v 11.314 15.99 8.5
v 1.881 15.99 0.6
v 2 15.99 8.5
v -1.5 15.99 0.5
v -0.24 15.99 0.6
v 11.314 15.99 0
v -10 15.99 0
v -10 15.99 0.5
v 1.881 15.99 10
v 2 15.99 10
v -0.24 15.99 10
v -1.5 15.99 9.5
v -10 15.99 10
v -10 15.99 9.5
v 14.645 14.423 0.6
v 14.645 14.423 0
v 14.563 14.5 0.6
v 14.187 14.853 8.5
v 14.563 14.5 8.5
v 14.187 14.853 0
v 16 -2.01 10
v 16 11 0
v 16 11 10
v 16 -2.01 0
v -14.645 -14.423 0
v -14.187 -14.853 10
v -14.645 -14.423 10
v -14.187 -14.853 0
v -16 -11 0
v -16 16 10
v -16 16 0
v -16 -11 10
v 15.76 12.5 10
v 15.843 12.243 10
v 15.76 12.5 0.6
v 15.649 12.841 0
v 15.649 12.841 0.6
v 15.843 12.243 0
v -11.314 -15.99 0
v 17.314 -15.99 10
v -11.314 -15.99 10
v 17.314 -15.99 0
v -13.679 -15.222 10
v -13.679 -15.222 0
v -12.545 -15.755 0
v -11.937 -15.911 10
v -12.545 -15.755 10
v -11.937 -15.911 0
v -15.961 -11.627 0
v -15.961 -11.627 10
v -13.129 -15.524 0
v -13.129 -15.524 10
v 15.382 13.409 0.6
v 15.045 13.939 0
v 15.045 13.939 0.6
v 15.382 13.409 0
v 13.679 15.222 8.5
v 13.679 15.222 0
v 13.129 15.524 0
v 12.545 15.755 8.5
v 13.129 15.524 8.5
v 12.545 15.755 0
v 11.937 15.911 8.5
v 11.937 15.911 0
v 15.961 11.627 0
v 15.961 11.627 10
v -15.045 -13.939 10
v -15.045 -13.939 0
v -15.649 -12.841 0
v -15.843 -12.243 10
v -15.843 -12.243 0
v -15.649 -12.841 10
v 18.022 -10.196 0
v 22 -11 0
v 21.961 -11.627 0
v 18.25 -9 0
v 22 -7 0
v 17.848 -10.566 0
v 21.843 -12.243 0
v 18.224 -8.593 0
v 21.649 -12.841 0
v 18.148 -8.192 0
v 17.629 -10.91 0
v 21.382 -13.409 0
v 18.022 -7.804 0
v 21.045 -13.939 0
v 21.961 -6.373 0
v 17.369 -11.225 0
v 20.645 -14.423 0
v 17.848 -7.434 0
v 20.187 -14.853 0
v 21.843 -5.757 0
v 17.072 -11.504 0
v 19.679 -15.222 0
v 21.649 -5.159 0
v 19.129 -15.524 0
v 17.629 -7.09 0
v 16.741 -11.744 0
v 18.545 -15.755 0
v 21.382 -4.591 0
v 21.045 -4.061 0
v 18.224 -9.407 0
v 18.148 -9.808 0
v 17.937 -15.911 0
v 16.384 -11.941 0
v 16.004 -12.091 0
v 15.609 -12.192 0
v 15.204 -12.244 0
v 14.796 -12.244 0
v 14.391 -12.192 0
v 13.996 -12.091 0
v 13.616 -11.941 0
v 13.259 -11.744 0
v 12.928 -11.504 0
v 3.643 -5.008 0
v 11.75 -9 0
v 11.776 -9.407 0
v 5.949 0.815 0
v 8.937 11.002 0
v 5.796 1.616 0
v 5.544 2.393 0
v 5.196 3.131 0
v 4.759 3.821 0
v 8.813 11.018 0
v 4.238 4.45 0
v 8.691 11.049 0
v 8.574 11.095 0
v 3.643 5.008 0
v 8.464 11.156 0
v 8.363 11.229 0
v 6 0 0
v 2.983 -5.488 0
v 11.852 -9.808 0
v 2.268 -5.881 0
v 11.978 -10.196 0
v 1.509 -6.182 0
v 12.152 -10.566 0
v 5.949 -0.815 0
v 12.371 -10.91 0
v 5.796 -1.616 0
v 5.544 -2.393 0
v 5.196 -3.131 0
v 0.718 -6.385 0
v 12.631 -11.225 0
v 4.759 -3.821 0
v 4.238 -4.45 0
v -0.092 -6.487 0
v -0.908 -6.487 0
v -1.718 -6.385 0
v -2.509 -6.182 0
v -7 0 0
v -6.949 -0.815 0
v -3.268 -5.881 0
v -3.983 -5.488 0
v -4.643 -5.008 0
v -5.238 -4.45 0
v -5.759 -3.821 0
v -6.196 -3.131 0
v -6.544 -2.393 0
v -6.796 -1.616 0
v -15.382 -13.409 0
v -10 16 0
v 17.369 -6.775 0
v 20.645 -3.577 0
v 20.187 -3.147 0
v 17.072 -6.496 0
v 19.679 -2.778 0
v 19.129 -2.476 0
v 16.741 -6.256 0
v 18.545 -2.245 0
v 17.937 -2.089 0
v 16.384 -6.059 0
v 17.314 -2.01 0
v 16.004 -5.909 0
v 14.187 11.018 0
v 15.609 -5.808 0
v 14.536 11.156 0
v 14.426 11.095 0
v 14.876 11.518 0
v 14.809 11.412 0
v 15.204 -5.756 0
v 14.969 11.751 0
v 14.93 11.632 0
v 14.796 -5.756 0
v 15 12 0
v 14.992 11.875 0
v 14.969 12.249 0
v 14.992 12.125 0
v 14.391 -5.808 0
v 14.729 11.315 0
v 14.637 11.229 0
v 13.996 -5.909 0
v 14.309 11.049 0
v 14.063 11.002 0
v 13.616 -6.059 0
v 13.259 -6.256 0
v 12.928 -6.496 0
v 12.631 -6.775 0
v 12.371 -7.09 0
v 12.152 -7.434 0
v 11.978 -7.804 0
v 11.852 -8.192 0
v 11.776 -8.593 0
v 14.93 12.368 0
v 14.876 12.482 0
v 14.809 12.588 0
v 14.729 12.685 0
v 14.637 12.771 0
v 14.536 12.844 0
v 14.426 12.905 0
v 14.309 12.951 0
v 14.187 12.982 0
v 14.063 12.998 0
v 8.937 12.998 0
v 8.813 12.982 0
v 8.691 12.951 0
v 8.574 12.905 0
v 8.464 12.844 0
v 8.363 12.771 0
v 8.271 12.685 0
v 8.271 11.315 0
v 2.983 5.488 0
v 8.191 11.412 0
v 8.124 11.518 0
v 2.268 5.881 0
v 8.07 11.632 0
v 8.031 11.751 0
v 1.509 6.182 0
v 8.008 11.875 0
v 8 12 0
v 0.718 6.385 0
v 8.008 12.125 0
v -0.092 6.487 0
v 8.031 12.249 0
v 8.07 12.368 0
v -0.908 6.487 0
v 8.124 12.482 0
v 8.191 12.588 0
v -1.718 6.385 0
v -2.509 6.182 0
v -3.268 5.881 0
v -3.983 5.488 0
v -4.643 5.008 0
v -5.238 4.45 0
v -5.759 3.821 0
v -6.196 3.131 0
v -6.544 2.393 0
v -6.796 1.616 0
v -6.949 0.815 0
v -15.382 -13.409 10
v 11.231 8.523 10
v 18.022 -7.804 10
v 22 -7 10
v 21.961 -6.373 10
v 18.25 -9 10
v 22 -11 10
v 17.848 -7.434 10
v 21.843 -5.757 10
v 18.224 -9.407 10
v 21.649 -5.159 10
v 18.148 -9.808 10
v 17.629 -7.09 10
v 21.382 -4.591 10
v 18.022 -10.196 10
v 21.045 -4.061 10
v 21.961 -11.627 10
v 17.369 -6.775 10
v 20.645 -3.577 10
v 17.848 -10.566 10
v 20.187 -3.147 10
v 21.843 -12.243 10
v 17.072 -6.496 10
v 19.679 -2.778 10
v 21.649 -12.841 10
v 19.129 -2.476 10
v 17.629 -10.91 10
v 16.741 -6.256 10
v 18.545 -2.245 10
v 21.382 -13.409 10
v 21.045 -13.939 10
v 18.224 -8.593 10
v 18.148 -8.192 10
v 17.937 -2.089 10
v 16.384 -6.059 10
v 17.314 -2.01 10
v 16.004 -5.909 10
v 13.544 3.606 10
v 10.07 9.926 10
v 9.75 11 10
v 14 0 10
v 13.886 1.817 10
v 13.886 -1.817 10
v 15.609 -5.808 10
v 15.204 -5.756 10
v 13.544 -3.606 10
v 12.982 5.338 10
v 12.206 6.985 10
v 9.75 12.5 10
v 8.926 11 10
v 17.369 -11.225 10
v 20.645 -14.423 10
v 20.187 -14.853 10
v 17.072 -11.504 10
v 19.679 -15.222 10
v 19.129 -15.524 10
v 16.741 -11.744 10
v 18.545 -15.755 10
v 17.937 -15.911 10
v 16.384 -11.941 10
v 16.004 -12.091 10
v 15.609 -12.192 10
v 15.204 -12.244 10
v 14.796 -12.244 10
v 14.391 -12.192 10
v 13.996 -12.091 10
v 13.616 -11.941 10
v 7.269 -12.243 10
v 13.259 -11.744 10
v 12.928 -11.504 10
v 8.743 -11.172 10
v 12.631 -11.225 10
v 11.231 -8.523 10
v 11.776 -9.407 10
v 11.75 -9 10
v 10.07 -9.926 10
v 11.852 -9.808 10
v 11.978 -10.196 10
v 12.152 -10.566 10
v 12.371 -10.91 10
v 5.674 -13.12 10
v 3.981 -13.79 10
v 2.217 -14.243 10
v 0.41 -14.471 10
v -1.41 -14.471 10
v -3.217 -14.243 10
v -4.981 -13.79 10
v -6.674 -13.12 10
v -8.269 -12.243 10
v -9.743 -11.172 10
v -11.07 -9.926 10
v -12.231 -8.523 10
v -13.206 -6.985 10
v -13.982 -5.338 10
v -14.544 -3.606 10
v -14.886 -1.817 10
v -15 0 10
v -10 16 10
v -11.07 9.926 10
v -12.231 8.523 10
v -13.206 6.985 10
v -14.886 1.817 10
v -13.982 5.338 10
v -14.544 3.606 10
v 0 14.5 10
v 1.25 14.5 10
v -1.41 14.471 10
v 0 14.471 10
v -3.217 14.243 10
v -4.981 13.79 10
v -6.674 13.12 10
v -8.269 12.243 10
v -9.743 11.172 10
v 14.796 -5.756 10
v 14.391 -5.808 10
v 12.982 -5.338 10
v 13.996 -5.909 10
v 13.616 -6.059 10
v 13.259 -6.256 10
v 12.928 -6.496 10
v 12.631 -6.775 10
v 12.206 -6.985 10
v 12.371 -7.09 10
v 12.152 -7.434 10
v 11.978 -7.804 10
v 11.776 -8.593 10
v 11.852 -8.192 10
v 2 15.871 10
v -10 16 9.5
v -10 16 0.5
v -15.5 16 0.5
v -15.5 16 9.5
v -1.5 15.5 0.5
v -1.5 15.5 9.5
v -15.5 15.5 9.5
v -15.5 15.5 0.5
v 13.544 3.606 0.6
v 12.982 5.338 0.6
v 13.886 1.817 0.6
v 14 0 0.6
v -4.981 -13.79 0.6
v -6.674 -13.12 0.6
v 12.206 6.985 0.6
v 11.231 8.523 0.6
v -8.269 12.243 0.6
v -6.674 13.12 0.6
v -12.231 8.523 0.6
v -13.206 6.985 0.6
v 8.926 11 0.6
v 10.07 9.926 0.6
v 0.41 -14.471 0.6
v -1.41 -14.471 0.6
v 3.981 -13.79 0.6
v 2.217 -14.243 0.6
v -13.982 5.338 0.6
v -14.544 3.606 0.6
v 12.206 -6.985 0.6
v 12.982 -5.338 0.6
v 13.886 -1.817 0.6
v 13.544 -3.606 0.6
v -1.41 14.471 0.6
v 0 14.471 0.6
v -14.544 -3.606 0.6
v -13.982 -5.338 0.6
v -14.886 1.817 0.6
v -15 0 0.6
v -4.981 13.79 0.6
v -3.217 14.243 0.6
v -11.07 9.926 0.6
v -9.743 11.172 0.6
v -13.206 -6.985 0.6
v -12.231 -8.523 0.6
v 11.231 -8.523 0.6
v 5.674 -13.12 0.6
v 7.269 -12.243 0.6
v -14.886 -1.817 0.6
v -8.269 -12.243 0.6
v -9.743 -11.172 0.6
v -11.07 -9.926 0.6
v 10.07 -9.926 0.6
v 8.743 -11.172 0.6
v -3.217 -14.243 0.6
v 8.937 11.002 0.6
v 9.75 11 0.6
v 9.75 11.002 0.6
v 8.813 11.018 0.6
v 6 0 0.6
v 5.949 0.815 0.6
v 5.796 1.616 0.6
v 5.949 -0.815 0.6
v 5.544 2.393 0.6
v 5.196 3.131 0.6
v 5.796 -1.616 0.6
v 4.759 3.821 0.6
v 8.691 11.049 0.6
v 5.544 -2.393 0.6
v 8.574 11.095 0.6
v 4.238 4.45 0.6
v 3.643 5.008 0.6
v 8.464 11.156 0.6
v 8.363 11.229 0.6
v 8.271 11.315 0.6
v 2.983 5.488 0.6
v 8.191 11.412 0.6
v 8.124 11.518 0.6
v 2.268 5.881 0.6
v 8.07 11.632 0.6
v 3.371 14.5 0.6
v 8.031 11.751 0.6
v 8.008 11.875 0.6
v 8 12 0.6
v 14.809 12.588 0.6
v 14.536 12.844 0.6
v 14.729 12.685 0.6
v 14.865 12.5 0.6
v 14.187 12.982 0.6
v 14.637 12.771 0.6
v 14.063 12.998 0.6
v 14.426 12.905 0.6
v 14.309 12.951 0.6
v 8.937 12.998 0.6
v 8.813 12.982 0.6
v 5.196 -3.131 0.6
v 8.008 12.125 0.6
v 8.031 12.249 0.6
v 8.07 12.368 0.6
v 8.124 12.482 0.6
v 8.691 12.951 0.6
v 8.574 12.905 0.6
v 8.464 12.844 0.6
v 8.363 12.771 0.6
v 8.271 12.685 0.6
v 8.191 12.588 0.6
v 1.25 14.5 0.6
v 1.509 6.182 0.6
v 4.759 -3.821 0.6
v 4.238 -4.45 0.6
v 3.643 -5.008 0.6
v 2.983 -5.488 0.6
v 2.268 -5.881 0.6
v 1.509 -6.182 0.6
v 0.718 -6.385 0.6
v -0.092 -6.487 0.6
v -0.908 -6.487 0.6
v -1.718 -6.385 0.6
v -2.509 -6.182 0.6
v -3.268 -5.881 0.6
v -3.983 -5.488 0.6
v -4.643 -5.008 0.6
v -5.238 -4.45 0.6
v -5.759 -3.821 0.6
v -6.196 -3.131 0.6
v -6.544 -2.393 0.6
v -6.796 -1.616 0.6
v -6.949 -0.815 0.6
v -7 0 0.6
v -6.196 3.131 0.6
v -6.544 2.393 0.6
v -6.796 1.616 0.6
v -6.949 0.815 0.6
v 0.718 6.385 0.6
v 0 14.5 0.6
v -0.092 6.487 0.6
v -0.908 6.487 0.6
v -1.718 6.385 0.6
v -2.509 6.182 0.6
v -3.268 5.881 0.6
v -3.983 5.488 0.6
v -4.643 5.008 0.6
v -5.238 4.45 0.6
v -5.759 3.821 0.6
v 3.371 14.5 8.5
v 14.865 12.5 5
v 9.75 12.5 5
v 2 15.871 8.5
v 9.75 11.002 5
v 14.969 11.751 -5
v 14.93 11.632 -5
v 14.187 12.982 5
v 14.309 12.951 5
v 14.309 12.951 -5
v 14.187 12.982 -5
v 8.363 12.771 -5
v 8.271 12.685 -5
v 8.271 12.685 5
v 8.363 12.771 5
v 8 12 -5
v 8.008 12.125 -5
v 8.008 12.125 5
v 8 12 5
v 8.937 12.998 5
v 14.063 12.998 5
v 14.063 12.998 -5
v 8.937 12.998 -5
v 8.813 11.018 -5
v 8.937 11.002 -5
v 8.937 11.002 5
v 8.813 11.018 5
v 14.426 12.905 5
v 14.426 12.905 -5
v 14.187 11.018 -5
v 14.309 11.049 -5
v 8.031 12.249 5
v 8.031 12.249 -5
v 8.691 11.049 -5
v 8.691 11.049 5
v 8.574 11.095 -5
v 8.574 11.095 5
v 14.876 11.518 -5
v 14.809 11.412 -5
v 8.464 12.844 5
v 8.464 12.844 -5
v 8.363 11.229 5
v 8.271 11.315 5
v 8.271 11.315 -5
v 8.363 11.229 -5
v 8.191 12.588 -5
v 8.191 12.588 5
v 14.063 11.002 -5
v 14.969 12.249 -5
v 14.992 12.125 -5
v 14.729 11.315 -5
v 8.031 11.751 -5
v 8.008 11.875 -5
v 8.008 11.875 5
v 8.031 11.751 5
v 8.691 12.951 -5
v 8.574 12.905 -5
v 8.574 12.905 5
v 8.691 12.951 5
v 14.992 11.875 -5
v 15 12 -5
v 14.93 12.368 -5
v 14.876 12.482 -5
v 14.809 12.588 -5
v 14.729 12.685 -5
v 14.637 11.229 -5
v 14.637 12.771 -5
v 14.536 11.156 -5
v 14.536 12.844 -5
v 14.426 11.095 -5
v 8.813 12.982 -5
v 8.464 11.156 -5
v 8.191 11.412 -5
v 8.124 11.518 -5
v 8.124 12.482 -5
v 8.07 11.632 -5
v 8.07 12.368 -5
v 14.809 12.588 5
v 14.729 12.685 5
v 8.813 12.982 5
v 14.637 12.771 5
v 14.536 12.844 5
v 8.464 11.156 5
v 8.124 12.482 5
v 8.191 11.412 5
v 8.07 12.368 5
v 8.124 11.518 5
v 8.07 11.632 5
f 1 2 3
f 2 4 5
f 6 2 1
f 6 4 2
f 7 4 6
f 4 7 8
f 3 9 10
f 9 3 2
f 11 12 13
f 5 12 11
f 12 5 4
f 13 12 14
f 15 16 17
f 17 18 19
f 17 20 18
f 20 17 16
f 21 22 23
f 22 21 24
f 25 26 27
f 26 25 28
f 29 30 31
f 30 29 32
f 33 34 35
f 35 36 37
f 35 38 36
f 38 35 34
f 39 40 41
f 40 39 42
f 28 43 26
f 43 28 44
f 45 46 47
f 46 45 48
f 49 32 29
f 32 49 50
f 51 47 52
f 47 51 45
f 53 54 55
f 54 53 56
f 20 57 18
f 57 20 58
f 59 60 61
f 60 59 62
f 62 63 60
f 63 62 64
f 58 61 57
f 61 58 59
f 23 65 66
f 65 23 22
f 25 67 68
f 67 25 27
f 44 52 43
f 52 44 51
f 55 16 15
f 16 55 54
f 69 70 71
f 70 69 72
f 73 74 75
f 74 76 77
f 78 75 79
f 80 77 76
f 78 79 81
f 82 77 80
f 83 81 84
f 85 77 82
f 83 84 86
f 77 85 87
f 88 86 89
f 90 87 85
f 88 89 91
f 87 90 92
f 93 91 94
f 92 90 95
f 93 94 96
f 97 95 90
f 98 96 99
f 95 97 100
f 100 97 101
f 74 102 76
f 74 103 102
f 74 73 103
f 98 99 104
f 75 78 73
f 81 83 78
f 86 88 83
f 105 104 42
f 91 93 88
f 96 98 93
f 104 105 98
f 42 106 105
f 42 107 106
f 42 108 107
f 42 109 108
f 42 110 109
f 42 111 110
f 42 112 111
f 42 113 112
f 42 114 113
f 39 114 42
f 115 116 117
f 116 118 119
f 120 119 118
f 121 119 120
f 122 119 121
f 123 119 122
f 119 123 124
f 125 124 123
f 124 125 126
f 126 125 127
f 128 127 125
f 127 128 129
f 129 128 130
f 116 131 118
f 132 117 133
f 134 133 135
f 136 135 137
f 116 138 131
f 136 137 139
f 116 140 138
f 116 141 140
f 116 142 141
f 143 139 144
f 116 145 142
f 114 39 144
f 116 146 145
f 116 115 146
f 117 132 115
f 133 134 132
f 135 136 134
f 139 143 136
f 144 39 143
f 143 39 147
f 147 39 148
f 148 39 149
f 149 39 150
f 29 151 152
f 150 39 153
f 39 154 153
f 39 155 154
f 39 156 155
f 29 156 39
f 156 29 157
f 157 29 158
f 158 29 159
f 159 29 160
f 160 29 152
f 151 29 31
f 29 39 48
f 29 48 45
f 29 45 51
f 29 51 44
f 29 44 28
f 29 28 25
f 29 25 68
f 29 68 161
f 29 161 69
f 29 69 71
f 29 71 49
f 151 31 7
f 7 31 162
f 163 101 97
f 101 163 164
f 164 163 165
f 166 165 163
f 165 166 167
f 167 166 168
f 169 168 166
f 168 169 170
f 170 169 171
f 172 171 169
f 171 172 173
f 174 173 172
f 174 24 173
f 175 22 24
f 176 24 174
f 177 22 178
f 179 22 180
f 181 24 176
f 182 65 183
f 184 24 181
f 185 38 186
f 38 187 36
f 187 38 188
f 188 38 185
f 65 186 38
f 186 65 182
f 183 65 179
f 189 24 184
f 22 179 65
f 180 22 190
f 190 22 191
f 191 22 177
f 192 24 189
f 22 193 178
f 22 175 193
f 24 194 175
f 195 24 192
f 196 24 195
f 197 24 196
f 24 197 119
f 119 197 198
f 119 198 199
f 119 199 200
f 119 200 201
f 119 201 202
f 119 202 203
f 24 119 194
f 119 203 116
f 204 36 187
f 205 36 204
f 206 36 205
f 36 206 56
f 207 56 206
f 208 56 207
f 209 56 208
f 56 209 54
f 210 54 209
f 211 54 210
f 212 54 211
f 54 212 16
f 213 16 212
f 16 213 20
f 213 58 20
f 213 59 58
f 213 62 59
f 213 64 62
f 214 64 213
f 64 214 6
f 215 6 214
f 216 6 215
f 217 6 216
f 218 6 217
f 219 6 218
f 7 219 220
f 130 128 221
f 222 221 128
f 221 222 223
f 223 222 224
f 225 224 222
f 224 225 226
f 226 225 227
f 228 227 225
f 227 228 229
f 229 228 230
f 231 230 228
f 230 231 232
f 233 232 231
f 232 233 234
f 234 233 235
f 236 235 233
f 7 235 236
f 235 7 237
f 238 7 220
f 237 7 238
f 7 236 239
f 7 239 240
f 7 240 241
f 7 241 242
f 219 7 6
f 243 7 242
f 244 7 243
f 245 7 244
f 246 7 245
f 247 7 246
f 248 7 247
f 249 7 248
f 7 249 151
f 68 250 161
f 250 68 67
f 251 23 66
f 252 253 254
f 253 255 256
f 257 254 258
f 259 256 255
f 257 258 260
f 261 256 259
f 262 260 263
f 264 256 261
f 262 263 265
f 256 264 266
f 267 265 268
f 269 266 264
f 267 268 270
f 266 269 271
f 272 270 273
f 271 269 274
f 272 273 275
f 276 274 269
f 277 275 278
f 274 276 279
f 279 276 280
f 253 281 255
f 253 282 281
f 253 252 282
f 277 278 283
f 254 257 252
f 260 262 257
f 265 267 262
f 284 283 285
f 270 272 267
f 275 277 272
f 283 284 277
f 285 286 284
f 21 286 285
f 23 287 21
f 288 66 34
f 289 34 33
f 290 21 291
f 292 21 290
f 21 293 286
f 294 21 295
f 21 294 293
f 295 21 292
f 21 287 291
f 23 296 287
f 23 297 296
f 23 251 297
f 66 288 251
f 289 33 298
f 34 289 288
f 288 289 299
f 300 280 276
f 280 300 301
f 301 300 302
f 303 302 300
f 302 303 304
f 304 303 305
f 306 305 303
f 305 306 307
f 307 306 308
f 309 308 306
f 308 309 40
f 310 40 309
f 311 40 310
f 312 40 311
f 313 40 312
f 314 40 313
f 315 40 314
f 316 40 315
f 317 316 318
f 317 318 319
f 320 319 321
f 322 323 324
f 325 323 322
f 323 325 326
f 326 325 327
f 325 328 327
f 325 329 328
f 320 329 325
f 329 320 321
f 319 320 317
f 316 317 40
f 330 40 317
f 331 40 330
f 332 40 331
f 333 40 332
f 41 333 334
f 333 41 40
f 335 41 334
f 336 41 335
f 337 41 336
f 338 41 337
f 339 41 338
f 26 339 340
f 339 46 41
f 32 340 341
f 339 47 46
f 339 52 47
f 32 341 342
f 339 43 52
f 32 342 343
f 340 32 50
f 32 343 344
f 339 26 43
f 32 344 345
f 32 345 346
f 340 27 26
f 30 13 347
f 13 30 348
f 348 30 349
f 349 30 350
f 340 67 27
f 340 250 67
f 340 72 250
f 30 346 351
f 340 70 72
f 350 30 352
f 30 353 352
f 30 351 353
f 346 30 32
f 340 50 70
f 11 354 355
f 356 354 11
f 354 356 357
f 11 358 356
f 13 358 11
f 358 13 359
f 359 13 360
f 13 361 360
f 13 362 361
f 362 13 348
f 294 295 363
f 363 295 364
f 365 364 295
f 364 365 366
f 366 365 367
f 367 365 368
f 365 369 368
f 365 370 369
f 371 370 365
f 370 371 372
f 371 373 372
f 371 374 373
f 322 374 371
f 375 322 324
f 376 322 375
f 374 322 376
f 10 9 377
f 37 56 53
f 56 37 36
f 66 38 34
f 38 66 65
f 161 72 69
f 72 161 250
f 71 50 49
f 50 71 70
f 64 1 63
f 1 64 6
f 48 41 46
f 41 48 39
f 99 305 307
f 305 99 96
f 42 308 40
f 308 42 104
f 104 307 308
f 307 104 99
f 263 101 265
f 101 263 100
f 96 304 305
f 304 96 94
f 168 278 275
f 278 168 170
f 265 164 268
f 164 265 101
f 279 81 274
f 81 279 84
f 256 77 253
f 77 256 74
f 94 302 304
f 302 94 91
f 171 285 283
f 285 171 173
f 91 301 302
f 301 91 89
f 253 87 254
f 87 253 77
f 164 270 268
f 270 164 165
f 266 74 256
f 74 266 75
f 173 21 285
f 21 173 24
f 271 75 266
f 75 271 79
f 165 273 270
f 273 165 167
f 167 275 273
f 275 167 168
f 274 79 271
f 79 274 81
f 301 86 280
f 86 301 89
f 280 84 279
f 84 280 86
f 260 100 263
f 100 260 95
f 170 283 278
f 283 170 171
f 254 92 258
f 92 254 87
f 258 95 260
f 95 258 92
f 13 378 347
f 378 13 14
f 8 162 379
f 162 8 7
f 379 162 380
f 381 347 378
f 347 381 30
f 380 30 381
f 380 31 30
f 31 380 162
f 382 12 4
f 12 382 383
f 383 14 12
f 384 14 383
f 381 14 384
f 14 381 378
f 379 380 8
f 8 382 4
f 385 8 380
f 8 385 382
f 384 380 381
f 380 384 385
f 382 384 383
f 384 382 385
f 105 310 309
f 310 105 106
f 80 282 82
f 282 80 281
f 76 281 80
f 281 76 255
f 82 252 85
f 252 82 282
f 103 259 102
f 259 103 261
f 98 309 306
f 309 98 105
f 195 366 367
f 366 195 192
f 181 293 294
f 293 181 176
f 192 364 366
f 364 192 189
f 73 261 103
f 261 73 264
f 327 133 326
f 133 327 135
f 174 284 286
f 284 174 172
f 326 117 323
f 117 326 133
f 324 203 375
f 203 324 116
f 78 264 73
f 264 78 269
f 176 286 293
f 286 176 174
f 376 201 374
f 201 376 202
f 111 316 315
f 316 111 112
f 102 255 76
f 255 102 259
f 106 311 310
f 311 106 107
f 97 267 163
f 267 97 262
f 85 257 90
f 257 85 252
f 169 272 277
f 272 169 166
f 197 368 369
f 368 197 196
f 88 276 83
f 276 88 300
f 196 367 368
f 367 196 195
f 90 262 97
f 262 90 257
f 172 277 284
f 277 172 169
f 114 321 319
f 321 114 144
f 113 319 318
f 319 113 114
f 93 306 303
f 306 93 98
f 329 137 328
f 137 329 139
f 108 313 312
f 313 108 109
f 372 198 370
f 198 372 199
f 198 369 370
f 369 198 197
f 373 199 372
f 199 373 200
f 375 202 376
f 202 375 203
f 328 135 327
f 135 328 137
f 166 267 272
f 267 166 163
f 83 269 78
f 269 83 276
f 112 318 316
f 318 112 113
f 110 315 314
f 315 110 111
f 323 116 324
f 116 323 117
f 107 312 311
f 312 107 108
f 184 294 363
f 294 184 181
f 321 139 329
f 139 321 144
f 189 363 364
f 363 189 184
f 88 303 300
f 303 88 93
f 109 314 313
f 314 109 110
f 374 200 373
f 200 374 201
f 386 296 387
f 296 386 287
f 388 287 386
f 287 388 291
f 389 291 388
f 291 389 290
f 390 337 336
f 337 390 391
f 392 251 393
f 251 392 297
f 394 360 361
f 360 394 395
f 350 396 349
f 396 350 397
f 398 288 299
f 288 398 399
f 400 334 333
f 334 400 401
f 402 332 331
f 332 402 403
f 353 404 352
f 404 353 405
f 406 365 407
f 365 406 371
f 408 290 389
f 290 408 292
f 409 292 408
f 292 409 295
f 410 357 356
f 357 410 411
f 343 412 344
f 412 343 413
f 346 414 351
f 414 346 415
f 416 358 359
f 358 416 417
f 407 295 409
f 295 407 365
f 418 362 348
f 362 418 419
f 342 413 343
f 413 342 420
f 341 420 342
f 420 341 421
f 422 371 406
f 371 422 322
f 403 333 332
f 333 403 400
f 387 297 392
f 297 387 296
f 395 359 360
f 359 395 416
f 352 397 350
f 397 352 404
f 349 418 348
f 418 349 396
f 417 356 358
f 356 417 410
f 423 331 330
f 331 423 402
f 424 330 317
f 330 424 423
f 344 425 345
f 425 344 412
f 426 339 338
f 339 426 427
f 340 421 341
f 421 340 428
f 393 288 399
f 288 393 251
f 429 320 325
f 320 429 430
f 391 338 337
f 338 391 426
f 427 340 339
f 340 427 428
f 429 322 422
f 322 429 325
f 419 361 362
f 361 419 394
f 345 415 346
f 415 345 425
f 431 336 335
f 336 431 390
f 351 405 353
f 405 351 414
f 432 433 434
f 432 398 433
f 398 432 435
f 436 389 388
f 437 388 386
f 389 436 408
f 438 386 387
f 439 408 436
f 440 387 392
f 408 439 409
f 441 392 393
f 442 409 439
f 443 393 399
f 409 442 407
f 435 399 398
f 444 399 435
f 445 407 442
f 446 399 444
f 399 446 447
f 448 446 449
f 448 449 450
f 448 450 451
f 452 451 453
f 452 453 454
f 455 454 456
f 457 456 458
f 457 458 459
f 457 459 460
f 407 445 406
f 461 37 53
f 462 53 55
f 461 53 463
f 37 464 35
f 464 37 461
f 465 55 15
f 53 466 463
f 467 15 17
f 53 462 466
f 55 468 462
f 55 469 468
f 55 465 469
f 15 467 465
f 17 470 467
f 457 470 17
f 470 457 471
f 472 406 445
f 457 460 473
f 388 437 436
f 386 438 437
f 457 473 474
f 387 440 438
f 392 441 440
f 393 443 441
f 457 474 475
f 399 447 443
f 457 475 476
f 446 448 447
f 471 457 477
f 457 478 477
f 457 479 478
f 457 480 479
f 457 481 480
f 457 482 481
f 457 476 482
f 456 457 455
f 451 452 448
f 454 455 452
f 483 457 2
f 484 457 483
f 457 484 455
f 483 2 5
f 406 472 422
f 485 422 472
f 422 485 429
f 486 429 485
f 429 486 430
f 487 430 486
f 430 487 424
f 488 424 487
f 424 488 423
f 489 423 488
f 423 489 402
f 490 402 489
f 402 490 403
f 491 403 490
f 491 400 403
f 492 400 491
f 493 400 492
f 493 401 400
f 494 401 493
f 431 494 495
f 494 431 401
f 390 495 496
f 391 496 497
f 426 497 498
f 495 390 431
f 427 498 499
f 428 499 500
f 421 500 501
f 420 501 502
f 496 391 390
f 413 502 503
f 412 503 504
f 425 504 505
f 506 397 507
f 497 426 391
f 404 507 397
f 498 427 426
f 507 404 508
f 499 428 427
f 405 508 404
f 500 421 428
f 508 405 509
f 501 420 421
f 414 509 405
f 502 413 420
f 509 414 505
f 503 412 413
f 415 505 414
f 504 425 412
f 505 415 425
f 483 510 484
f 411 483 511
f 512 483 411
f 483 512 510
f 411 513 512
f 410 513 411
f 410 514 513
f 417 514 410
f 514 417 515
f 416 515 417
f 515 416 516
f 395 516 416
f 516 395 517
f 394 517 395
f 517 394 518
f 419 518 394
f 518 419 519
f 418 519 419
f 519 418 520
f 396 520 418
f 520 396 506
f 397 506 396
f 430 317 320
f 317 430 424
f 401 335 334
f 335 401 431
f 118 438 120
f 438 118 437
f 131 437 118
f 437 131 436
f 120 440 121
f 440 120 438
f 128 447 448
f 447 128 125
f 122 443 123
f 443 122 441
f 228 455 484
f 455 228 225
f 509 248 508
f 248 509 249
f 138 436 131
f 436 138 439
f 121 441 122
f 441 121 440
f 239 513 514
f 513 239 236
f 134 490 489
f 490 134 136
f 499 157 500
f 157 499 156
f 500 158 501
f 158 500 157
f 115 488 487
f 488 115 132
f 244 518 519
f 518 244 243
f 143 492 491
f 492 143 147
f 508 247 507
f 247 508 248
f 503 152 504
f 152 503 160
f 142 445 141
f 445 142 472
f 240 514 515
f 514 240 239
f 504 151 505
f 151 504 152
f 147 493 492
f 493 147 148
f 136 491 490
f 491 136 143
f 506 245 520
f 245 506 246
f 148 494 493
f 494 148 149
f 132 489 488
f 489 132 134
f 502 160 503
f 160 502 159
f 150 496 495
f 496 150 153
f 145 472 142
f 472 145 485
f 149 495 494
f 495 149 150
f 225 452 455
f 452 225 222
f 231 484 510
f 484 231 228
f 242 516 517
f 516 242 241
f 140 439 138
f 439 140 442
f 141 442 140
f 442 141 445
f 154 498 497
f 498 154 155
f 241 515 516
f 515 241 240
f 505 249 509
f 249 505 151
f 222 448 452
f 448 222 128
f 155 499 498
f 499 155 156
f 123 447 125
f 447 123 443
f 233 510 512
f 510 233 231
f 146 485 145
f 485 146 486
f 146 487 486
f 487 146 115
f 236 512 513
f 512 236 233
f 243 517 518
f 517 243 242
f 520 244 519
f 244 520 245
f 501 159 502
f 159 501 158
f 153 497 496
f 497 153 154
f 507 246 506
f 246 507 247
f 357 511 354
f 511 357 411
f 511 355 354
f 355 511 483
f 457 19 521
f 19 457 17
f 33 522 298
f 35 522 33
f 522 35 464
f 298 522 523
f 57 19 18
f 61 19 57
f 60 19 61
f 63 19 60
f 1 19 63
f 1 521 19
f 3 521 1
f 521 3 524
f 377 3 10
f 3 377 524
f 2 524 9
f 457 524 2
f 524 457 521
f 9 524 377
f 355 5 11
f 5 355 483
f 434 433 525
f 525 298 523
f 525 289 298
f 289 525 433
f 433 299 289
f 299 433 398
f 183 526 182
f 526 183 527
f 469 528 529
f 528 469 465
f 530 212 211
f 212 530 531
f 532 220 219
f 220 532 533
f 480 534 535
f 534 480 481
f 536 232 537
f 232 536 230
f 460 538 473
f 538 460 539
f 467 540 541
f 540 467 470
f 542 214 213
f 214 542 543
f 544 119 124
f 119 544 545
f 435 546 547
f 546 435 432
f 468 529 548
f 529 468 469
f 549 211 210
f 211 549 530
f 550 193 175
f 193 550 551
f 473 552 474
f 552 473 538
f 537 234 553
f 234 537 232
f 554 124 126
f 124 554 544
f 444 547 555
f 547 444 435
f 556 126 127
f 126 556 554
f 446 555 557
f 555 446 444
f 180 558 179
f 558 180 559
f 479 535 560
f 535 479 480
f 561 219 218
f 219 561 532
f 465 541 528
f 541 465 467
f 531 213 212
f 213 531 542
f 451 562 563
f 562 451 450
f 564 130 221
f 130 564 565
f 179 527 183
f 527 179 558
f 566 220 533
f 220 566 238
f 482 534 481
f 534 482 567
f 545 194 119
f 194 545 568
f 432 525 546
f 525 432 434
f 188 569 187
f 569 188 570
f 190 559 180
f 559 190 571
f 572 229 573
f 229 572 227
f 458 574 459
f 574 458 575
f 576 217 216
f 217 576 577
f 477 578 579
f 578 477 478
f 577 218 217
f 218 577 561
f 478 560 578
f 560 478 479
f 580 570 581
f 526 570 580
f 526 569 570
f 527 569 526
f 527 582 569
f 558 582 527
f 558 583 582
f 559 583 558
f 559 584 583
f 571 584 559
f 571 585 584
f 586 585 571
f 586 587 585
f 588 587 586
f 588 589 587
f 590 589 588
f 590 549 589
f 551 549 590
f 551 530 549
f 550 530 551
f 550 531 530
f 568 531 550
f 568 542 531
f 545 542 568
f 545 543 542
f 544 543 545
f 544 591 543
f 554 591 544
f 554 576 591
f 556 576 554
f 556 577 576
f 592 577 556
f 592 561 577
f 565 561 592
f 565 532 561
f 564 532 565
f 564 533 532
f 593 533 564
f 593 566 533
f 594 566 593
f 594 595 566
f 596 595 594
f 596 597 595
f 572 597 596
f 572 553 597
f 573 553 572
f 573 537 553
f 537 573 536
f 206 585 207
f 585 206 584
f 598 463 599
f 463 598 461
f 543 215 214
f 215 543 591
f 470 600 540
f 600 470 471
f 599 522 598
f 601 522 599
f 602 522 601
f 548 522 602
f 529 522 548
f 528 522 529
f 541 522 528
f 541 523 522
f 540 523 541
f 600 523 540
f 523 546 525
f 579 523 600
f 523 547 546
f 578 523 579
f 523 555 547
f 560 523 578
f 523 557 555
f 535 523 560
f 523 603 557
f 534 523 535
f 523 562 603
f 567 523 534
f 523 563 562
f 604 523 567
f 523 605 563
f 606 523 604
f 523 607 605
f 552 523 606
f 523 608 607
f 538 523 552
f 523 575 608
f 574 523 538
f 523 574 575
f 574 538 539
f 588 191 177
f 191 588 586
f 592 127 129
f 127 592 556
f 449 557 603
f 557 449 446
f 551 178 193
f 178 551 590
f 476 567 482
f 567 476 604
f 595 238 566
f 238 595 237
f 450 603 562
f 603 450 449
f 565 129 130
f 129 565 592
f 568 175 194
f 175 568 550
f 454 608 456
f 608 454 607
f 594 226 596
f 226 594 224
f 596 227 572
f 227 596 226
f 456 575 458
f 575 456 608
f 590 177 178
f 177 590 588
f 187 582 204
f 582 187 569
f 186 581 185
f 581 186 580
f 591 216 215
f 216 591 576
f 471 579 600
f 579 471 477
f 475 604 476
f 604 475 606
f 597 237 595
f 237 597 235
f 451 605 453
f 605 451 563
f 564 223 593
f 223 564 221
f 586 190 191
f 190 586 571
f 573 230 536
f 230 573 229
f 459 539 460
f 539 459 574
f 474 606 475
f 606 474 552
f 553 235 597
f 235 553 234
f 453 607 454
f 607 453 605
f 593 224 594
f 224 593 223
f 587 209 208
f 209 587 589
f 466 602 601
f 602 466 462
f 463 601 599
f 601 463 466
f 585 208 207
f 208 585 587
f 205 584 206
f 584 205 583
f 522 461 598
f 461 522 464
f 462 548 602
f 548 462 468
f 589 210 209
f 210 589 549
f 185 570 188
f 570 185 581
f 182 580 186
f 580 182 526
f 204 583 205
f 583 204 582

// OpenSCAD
$fn = 50;


union() {
	difference() {
		union() {
			hull() {
				translate(v = [-11.0000000000, 11.0000000000, 0]) {
					cylinder(h = 10, r = 5);
				}
				translate(v = [11.0000000000, 11.0000000000, 0]) {
					cylinder(h = 10, r = 5);
				}
				translate(v = [-11.0000000000, -11.0000000000, 0]) {
					cylinder(h = 10, r = 5);
				}
				translate(v = [11.0000000000, -11.0000000000, 0]) {
					cylinder(h = 10, r = 5);
				}
			}
			translate(v = [7.5000000000, -9.0000000000, 0]) {
				hull() {
					translate(v = [-9.5000000000, 2.0000000000, 0]) {
						cylinder(h = 10, r = 5);
					}
					translate(v = [9.5000000000, 2.0000000000, 0]) {
						cylinder(h = 10, r = 5);
					}
					translate(v = [-9.5000000000, -2.0000000000, 0]) {
						cylinder(h = 10, r = 5);
					}
					translate(v = [9.5000000000, -2.0000000000, 0]) {
						cylinder(h = 10, r = 5);
					}
				}
			}
			translate(v = [-16.0000000000, 10.0000000000, 0]) {
				cube(size = [6, 6, 10]);
			}
		}
		union() {
			translate(v = [-15.5000000000, 15.5000000000, 0.5000000000]) {
				cube(size = [14, 0.5000000000, 9.0000000000]);
			}
			translate(v = [15.0000000000, -9.0000000000, -100.0000000000]) {
				cylinder(h = 200, r = 3.2500000000);
			}
			translate(v = [-0.5000000000, 0.0000000000, 0.6000000000]) {
				cylinder(h = 12.4000000000, r = 14.5000000000);
			}
			translate(v = [-0.5000000000, 0.0000000000, -5.0000000000]) {
				cylinder(h = 10, r = 6.5000000000);
			}
			translate(v = [0.0000000000, 12.5000000000, 0.6000000000]) {
				cube(size = [16.0000000000, 2, 12.4000000000]);
			}
			translate(v = [2.0000000000, 12.5000000000, 8.5000000000]) {
				cube(size = [14.0000000000, 5, 1.5000000000]);
			}
			translate(v = [-3.0000000000, 18.7500000000, 0.6000000000]) {
				rotate(a = [0, 0, -45]) {
					cube(size = [10, 1.5000000000, 12.4000000000]);
				}
			}
			translate(v = [2.2500000000, 11.0000000000, 0.6000000000]) {
				cube(size = [7.5000000000, 2, 9.4000000000]);
			}
		}
	}
	union() {
		translate(v = [11.5000000000, 12, -5.0000000000]) {
			rotate(a = [0, 0, 0]) {
				difference() {
					union() {
						hull() {
							translate(v = [2.5000000000, 0, 0]) {
								cylinder(h = 10, r = 1.0000000000, r1 = 1.0000000000, r2 = 1.0000000000);
							}
							translate(v = [-2.5000000000, 0, 0]) {
								cylinder(h = 10, r = 1.0000000000, r1 = 1.0000000000, r2 = 1.0000000000);
							}
						}
					}
					union();
				}
			}
		}
	}
}
